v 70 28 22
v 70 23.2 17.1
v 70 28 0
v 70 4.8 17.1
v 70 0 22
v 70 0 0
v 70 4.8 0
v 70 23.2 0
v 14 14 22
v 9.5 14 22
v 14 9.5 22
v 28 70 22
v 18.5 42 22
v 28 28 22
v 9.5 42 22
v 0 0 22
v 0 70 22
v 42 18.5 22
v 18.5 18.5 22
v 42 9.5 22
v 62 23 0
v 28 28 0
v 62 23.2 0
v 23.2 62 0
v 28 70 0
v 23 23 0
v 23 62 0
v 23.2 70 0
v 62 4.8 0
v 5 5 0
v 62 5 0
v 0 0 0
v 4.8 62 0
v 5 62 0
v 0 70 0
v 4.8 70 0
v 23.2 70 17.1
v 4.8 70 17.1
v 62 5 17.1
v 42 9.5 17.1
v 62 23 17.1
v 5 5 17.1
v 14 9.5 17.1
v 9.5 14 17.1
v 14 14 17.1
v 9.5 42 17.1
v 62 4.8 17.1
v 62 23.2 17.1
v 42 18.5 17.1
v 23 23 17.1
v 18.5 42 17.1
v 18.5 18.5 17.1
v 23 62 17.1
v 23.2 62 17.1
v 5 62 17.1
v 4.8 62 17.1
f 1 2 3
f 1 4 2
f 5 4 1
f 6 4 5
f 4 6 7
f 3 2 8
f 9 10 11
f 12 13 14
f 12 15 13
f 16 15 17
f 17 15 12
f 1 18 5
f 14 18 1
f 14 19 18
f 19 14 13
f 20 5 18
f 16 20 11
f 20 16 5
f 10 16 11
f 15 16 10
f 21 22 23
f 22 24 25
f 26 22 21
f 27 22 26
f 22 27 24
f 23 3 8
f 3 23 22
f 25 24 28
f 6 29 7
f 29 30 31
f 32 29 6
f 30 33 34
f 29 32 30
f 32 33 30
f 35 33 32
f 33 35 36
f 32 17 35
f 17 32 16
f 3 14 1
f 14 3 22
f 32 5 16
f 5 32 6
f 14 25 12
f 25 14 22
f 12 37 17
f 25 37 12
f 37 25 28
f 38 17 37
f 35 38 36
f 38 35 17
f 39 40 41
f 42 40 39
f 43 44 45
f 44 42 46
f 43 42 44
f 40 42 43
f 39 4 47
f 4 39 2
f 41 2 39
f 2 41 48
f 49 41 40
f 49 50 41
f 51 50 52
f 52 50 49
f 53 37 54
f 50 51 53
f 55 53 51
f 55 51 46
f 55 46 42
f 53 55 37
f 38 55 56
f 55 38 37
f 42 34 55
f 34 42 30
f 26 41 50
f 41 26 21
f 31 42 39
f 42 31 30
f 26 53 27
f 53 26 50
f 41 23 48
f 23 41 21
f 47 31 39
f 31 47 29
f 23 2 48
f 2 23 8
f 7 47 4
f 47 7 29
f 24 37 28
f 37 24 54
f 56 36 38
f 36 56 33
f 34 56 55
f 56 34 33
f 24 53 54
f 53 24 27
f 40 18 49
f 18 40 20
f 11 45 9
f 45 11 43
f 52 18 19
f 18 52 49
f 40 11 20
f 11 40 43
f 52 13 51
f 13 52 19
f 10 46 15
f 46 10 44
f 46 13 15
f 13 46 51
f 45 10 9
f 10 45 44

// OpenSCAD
// Kulaksız gövde — 70×22, et 5 mm, U kanal 18 mm.

clamp = 18;
entry = 18.4;
wall = 5;
arm = 70;
h = 22;
top = 5;
drop = h - top;
mouth = 8;
ch = wall + clamp + wall;

difference() {
  union() {
    cube([arm, ch, h]);
    cube([ch, arm, h]);
  }
  translate([wall, wall, -0.1]) cube([arm - wall + 1, clamp, drop + 0.2]);
  translate([wall, wall, -0.1]) cube([clamp, arm - wall + 1, drop + 0.2]);
  flare = (entry - clamp) / 2;
  translate([arm - mouth, wall - flare, -0.1]) cube([mouth + 1, entry, drop + 0.2]);
  translate([wall - flare, arm - mouth, -0.1]) cube([entry, mouth + 1, drop + 0.2]);
  win = 9;
  translate([14, wall + (clamp - win) / 2, drop - 1]) cube([28, win, top + 2]);
  translate([wall + (clamp - win) / 2, 14, drop - 1]) cube([win, 28, top + 2]);
}
